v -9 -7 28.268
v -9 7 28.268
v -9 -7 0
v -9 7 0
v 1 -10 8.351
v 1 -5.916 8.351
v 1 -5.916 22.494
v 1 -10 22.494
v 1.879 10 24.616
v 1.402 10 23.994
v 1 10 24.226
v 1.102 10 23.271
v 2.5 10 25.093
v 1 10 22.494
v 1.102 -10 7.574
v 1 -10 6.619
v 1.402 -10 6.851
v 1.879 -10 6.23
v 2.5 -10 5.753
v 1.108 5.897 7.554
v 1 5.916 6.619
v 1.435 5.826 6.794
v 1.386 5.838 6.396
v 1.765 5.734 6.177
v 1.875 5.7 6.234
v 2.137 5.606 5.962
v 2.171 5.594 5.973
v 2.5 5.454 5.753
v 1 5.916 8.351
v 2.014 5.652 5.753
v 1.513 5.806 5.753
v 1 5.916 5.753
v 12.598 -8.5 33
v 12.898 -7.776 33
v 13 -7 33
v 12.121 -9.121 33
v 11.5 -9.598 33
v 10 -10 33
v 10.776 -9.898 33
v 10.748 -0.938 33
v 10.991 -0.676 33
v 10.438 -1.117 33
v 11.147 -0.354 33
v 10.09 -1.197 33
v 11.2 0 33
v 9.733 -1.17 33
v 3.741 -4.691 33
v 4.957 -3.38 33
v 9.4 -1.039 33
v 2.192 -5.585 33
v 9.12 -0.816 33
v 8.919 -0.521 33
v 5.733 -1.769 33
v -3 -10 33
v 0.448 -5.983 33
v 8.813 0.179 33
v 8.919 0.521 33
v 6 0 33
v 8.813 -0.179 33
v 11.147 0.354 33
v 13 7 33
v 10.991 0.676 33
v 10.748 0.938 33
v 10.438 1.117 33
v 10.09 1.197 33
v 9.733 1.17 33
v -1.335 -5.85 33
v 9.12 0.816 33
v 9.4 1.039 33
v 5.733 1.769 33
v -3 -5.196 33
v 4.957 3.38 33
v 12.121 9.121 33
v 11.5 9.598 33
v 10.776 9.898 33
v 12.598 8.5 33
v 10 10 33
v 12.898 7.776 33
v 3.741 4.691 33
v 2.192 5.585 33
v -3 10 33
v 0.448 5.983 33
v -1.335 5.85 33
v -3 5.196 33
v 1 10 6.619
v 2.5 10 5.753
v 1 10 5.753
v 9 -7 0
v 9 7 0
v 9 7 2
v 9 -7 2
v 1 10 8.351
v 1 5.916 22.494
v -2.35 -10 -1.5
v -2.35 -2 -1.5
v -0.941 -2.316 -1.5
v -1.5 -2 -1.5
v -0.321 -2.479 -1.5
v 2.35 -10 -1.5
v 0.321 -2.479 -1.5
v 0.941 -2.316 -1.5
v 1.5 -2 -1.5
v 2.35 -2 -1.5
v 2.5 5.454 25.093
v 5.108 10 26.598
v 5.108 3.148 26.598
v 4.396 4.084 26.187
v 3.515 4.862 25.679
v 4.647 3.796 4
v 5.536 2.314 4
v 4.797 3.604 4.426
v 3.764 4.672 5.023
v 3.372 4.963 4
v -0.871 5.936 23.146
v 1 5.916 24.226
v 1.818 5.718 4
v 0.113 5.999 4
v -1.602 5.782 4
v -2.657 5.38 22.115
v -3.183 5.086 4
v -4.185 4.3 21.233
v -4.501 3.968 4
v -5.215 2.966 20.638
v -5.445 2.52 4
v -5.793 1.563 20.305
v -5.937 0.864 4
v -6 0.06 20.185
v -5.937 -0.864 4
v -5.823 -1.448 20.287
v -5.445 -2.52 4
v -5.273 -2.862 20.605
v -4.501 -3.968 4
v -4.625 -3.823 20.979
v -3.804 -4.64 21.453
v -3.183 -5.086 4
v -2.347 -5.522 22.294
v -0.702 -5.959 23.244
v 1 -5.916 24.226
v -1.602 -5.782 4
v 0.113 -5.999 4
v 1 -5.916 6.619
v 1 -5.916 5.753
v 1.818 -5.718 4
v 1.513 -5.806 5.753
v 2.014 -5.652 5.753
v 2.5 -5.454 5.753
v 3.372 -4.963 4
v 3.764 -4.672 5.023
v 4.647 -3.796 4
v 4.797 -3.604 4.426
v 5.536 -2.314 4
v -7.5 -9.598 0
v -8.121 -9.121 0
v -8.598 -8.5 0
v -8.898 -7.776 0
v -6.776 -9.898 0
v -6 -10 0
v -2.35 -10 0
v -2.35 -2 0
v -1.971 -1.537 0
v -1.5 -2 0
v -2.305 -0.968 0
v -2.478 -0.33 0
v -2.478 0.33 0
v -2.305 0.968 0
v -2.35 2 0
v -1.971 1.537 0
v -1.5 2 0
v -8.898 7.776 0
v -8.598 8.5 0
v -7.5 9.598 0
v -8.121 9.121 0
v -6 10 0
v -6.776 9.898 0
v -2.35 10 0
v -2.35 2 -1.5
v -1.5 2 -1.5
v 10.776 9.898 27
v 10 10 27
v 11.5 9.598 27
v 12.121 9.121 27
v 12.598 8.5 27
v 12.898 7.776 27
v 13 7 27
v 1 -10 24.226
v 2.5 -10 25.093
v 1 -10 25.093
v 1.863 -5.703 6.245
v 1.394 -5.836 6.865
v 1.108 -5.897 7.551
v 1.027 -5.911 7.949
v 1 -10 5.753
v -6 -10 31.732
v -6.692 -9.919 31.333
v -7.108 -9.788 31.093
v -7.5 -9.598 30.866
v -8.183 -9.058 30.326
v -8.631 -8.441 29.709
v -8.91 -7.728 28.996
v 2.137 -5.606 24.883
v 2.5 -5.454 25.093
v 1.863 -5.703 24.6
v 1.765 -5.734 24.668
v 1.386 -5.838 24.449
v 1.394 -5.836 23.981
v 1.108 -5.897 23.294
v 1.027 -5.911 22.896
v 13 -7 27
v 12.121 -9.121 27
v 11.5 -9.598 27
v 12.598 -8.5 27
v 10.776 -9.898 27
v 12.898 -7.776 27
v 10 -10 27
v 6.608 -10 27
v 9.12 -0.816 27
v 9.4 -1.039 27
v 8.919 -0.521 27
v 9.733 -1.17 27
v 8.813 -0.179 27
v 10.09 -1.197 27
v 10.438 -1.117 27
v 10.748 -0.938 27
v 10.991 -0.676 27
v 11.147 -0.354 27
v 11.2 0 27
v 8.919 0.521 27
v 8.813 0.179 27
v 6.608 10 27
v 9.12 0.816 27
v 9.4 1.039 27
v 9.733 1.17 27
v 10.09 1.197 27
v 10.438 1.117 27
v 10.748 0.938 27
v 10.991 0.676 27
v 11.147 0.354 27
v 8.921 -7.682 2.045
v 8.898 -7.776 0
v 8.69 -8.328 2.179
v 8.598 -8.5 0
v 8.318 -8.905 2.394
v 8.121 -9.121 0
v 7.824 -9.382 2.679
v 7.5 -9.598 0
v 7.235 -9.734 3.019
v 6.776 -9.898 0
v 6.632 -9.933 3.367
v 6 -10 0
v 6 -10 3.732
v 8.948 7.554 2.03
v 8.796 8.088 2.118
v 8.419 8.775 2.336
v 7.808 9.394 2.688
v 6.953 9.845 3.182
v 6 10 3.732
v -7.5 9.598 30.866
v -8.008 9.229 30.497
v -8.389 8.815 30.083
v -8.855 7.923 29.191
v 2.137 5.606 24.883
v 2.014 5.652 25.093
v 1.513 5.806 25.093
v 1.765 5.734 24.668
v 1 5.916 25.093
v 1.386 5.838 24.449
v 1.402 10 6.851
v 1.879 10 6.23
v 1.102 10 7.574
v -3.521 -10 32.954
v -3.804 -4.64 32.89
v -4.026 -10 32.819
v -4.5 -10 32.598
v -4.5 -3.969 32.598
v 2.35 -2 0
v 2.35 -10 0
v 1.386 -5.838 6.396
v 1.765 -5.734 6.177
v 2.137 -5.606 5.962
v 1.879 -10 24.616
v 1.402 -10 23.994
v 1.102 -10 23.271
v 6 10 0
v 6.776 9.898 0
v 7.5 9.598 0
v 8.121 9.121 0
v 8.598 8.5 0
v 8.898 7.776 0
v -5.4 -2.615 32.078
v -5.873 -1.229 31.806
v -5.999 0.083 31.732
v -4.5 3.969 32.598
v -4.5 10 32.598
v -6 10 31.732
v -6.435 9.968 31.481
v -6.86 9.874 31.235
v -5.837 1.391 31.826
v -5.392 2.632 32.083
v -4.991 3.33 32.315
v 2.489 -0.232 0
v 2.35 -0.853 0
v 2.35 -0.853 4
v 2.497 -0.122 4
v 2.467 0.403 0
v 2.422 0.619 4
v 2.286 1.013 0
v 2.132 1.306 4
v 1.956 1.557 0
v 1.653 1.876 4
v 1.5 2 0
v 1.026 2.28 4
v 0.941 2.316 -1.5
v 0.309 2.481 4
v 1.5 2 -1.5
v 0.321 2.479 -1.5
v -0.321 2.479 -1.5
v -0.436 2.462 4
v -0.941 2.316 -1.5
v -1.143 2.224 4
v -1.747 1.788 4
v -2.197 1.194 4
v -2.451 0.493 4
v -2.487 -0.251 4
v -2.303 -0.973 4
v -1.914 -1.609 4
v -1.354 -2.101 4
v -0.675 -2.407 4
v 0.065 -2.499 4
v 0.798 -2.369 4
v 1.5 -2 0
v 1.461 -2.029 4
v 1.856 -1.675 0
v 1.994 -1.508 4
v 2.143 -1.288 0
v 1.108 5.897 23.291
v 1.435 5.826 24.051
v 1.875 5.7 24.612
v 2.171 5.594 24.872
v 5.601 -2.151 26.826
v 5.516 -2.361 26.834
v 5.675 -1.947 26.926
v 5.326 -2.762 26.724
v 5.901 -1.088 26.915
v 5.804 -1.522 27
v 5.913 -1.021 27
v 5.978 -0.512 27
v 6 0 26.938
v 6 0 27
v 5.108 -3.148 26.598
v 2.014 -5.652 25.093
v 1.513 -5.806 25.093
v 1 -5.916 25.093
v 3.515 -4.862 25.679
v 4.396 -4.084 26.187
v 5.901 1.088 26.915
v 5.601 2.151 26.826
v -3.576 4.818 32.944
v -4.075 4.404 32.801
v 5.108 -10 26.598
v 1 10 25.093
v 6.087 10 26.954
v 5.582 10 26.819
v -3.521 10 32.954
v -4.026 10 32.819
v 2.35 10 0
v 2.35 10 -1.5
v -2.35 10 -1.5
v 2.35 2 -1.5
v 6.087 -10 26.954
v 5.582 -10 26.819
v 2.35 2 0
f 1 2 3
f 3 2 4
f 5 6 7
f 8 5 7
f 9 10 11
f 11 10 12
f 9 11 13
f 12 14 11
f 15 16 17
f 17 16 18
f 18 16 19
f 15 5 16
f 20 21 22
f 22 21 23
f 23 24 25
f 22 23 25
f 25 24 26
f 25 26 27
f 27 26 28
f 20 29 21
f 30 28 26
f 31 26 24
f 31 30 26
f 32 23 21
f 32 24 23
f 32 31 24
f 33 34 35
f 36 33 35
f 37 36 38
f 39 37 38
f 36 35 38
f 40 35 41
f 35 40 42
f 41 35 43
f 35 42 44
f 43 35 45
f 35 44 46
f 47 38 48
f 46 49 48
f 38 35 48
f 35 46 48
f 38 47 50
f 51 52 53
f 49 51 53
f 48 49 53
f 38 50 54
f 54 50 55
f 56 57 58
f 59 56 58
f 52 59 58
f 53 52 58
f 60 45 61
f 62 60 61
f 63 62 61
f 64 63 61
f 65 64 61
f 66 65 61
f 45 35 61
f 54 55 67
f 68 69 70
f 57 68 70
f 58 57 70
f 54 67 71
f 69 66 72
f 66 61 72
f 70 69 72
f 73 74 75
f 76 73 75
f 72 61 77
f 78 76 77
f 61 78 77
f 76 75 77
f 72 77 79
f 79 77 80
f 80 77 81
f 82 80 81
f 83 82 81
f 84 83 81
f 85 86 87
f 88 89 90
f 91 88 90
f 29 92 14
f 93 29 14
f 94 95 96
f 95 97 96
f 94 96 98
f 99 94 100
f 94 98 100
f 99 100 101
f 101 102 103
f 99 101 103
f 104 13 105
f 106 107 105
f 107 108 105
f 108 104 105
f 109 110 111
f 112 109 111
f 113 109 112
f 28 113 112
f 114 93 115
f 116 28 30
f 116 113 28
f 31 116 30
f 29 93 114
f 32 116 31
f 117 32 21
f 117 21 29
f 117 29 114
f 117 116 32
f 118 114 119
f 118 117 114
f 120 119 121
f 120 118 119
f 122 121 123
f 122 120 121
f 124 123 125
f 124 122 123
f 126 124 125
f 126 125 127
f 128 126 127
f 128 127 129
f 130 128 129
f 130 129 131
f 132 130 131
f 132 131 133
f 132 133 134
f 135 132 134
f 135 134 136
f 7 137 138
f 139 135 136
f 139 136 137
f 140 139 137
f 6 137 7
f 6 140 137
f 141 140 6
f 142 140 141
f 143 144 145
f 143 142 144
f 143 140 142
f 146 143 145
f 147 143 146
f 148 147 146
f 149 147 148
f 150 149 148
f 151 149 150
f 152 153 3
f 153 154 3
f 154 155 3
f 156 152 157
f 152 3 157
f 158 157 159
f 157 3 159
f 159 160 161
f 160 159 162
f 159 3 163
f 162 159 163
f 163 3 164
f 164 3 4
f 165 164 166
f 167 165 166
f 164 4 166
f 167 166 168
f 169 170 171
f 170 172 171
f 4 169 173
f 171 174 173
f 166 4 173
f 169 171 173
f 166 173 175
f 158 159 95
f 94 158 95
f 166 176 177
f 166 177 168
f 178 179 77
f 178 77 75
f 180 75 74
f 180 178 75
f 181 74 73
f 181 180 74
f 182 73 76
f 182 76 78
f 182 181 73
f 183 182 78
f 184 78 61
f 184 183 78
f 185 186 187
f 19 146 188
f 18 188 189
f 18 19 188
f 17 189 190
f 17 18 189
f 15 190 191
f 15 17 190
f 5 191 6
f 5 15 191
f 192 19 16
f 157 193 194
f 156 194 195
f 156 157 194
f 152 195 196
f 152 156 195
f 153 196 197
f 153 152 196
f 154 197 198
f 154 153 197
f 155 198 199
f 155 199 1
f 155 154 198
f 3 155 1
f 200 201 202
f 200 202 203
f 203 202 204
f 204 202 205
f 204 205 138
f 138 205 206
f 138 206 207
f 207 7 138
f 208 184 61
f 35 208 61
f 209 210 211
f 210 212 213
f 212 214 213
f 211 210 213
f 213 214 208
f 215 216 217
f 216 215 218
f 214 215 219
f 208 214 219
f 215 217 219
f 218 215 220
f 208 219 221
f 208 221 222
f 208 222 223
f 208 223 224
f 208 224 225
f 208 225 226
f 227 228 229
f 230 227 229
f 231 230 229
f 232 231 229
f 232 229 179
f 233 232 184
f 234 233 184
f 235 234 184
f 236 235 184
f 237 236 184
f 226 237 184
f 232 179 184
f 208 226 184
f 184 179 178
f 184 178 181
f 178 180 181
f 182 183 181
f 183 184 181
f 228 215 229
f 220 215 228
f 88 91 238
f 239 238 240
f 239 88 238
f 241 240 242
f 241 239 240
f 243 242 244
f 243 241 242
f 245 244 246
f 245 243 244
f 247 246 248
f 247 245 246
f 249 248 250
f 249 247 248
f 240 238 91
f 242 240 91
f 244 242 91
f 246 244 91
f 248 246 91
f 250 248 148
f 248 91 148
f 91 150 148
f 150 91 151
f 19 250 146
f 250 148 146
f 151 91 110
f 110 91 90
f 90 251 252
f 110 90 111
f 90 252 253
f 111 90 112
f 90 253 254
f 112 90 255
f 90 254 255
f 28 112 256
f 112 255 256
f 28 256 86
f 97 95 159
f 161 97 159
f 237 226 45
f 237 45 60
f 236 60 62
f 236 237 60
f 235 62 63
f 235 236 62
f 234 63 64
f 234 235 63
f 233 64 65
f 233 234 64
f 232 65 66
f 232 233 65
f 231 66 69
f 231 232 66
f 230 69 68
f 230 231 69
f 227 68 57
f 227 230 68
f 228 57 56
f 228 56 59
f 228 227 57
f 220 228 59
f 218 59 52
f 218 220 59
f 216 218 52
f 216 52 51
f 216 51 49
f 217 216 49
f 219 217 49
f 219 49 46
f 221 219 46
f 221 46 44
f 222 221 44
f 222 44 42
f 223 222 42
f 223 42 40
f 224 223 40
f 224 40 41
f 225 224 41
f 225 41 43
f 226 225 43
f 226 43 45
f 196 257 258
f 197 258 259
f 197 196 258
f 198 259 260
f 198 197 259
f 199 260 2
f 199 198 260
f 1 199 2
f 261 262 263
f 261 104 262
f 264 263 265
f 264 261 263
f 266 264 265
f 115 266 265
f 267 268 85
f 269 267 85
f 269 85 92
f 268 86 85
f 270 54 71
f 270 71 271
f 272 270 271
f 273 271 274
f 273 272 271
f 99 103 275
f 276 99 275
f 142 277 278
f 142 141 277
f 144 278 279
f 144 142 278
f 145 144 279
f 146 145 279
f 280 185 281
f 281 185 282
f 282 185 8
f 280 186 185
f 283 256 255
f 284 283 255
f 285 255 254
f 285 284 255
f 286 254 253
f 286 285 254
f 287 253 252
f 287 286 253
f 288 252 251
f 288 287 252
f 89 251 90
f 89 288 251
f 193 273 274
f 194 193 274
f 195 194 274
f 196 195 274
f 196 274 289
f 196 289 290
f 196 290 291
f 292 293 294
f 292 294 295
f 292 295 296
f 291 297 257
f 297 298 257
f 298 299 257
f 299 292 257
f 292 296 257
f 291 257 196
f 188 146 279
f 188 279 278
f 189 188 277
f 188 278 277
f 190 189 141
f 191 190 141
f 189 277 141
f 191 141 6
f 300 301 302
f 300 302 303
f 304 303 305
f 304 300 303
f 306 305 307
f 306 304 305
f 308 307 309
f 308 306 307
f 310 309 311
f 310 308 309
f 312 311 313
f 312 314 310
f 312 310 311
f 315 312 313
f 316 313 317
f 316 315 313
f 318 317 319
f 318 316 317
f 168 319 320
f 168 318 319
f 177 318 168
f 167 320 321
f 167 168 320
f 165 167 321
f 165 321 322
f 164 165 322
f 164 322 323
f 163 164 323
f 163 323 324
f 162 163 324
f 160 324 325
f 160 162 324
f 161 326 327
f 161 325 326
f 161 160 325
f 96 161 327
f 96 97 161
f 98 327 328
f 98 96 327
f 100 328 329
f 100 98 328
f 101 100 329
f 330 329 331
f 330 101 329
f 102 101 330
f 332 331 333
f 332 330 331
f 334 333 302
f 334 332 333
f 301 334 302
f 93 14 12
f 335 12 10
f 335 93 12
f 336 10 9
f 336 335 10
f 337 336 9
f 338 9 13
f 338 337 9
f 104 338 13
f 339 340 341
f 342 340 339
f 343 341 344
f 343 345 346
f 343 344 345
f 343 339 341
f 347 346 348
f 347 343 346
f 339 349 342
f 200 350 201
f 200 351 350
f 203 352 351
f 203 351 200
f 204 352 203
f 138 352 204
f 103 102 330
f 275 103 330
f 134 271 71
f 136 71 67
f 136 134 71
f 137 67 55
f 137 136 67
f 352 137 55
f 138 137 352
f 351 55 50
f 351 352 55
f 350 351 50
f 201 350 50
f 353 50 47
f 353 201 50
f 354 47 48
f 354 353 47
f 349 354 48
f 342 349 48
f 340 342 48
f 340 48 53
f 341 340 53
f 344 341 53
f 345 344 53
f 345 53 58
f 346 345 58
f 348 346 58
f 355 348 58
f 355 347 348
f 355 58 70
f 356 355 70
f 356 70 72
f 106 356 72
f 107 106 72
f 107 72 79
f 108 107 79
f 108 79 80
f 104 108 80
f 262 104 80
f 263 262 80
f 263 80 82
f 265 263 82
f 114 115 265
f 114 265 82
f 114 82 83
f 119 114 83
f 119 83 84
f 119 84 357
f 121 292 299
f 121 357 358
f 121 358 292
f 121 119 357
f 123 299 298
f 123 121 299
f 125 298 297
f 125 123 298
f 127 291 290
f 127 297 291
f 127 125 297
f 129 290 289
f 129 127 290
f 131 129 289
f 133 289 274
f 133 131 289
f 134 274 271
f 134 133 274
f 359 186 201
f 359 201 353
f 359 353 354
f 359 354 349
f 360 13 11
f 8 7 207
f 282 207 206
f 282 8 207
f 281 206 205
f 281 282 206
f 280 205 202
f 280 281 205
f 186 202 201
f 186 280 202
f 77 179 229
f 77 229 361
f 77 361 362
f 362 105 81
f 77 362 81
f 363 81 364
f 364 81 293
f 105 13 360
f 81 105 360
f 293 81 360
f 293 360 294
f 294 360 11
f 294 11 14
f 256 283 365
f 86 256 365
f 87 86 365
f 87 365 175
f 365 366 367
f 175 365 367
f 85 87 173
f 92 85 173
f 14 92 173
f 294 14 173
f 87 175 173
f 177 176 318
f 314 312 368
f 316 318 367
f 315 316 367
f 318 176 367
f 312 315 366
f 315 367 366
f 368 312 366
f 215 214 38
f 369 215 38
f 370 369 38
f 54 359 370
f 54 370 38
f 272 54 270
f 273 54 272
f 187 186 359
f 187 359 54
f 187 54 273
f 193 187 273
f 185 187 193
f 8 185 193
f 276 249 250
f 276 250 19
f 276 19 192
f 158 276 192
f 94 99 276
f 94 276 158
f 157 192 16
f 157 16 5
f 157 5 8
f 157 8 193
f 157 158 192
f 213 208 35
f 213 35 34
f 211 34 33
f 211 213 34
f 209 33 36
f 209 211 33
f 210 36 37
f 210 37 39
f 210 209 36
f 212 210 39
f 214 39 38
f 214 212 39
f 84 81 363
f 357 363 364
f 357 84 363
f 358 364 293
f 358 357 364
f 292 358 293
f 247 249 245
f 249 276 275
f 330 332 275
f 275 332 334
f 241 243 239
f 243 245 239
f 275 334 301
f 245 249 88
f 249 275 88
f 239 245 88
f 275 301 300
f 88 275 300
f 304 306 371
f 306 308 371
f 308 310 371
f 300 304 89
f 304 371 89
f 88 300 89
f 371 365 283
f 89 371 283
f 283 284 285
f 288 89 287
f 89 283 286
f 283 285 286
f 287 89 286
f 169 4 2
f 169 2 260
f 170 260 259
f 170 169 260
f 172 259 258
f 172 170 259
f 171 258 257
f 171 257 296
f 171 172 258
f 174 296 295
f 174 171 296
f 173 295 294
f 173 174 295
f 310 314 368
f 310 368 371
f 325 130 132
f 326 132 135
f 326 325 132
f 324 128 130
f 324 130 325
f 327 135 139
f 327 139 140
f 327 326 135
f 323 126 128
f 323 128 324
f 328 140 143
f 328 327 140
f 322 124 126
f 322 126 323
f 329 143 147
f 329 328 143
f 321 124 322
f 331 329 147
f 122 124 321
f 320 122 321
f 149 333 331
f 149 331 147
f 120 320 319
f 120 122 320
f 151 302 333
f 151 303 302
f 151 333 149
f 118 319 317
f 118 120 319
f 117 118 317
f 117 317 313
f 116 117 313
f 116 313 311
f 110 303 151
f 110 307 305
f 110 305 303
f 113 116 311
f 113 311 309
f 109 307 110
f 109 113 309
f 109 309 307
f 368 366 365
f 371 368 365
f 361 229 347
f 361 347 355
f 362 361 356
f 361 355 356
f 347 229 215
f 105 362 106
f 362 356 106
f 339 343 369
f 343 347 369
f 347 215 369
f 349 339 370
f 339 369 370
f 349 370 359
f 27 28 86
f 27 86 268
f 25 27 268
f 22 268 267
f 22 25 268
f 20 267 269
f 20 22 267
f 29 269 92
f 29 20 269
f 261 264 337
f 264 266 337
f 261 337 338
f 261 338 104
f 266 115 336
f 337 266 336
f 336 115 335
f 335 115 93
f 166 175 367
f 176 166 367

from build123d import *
from build123d.topology import SkipClean

# Parameters (mm, degrees)
BOSS_EXTRU_1_DEPTH           = 10
ENL_V_MAT_EXTRU_1_DEPTH      = 29.854594898
ENL_V_MAT_EXTRU_1_DEPTH_BACK = 29.854594898
ESQUISSE2_R                  = 2.5
ENL_V_START                  = 4
ESQUISSE3_R                  = 6
ENL_V_MAT_EXTRU_2_DEPTH      = 25.390139133
ESQUISSE5_W                  = 1.5
ESQUISSE5_H                  = 4
ENL_V_MAT_EXTRU_3_DEPTH      = 30.220241272
BOSS_EXTRU_2_REACH           = 35.257
ENL_V_START_2                = -20
ESQUISSE7_R                  = 1.2
ESQUISSE7_R_2                = 6
ENL_V_MAT_EXTRU_4_DEPTH      = 20
CONG_1_START                 = -10
CONG_1_DEPTH                 = 20
CONG_1_2_DEPTH               = 20
CONG_1_START_2               = 5.75277665
CONG_1_3_OUTLINE_R           = 6
CONG_1_3_DEPTH               = 28.24722335
CONG_1_START_3               = -1.5
CONG_1_4_DEPTH               = 7.669577456
CONG_1_5_DEPTH               = 2.598076411
CONG_1_START_4               = 22.494446401
CONG_1_6_DEPTH               = 2.598076411
CONG_1_7_DEPTH               = 20


with BuildPart() as part:
    # Esquisse1 → Boss.-Extru.1 (new, symmetric)
    with BuildSketch(Plane(origin=(0, 0, 0), x_dir=(1, 0, 0), z_dir=(0, 1, 0))):
        Polygon((2.35, 0), (9, 0), (9, -2), (1, -6.618802154), (1, -25), (-9, -25), (-9, 0), (-2.35, 0), (-2.35, 1.5), (2.35, 1.5), align=None)
    extrude(amount=BOSS_EXTRU_1_DEPTH, both=True)

    # Esquisse2 → Enlèv. mat.-Extru.1 (cut, two sides: drawn at the far end of the back side and taken through both)
    with BuildSketch(Plane(origin=(-1.372446517, 0, 0), x_dir=(1, 0, 0), z_dir=(0, 0, 1)).offset(-ENL_V_MAT_EXTRU_1_DEPTH_BACK)):
        with Locations(Location((1.372446517, 0, 0), (0, 0, 340.051556411))):
            Circle(ESQUISSE2_R)
    extrude(amount=ENL_V_MAT_EXTRU_1_DEPTH + ENL_V_MAT_EXTRU_1_DEPTH_BACK, mode=Mode.SUBTRACT)

    # Esquisse3 → Enlèv. mat.-Extru.2 (cut, through all)
    with BuildSketch(Plane.XY.offset(ENL_V_START)):
        Circle(ESQUISSE3_R)
    extrude(amount=ENL_V_MAT_EXTRU_2_DEPTH, mode=Mode.SUBTRACT)

    # Esquisse5 → Enlèv. mat.-Extru.3 (cut, through all)
    with BuildSketch(Plane.ZY.offset(2.35)):
        with Locations((-0.75, 0)):
            Rectangle(ESQUISSE5_W, ESQUISSE5_H)
    extrude(amount=-ENL_V_MAT_EXTRU_3_DEPTH, mode=Mode.SUBTRACT)

    # Boss.-Extru.2: up to this face of the body (flat: up to its plane)
    boss_extru_2_end = Plane(part.part.faces().sort_by_distance((-2.923443816, -10, 10.980550797))[0])
    # Esquisse6 → Boss.-Extru.2 (add, up to the picked face)
    with BuildSketch(Plane(origin=(0, 10, 0), x_dir=(1, 0, 0), z_dir=(0, 1, 0)), mode=Mode.PRIVATE) as boss_extru_2_sk1:
        Polygon((-9, -18.452994616), (5.803847577, -27), (13, -27), (13, -33), (-3.803847577, -33), (-9, -30), align=None)
    boss_extru_2_tool1 = split(extrude(boss_extru_2_sk1.sketch, amount=-BOSS_EXTRU_2_REACH, mode=Mode.PRIVATE), bisect_by=boss_extru_2_end, keep=Keep.BOTH, mode=Mode.PRIVATE)
    add(boss_extru_2_tool1.solids().sort_by(Axis((0.338478, 10, 27.943024), (0, -1, 0)))[0])

    # Esquisse7 → Enlèv. mat.-Extru.4 (cut)
    with BuildSketch(Plane.XY.offset(33).offset(ENL_V_START_2)):
        with Locations((10, 0)):
            Circle(ESQUISSE7_R)
        with Locations(Location((0, 0, 0), (0, 0, 230.656026391))):
            Circle(ESQUISSE7_R_2)
    extrude(amount=ENL_V_MAT_EXTRU_4_DEPTH, mode=Mode.SUBTRACT)

    # Congé1: read off the stored shape, not the designer's step
    # Congé1 outline → Congé1 (cut)
    with BuildSketch(Plane(origin=(0, 0, 0), x_dir=(1, 0, 0), z_dir=(0, 1, 0)).offset(CONG_1_START)):
        with BuildLine():
            Line((-9, -30), (-7.5, -30.866025404))
            ThreePointArc((-7.5, -30.866025404), (-8.598076211, -29.767949192), (-9, -28.267949192))
            Line((-9, -28.267949192), (-9, -30))
        make_face()
    extrude(amount=CONG_1_DEPTH, mode=Mode.SUBTRACT)

    # Cong_1 2 outline → Cong_1 2 (add)
    with BuildSketch(Plane(origin=(0, 0, 0), x_dir=(1, 0, 0), z_dir=(0, 1, 0)).offset(CONG_1_START)):
        with BuildLine():
            Line((5.803847577, -27), (6.607695155, -27))
            ThreePointArc((6.607695155, -27), (5.83123802, -26.897777479), (5.107695155, -26.598076211))
            Line((5.107695155, -26.598076211), (5.803847577, -27))
        make_face()
    extrude(amount=CONG_1_2_DEPTH)

    # Cong_1 3 outline → Cong_1 3 (cut)
    with BuildSketch(Plane.XY.offset(CONG_1_START_2)):
        with BuildLine():
            Line((-9, 10), (-9, 7))
            ThreePointArc((-9, 7), (-8.121320344, 9.121320344), (-6, 10))
            Line((-6, 10), (-9, 10))
        make_face()
        with BuildLine():
            ThreePointArc((-6, -10), (-8.121320344, -9.121320344), (-9, -7))
            Line((-9, -7), (-9, -10))
            Line((-9, -10), (-6, -10))
        make_face()
        Circle(CONG_1_3_OUTLINE_R)
        with BuildLine():
            Line((13, 10), (10, 10))
            ThreePointArc((10, 10), (12.121320344, 9.121320344), (13, 7))
            Line((13, 7), (13, 10))
        make_face()
        with BuildLine():
            ThreePointArc((13, -7), (12.121320344, -9.121320344), (10, -10))
            Line((10, -10), (13, -10))
            Line((13, -10), (13, -7))
        make_face()
    extrude(amount=CONG_1_3_DEPTH, mode=Mode.SUBTRACT)

    # Cong_1 4 outline → Cong_1 4 (cut)
    with BuildSketch(Plane.XY.offset(CONG_1_START_3)):
        with BuildLine():
            Line((-9, 10), (-9, 7))
            ThreePointArc((-9, 7), (-8.121320344, 9.121320344), (-6, 10))
            Line((-6, 10), (-9, 10))
        make_face()
        with BuildLine():
            ThreePointArc((-6, -10), (-8.121320344, -9.121320344), (-9, -7))
            Line((-9, -7), (-9, -10))
            Line((-9, -10), (-6, -10))
        make_face()
        with BuildLine():
            Line((9, 10), (6, 10))
            ThreePointArc((6, 10), (8.121320344, 9.121320344), (9, 7))
            Line((9, 7), (9, 10))
        make_face()
        with BuildLine():
            ThreePointArc((9, -7), (8.121320344, -9.121320344), (6, -10))
            Line((6, -10), (9, -10))
            Line((9, -10), (9, -7))
        make_face()
    extrude(amount=CONG_1_4_DEPTH, mode=Mode.SUBTRACT)

    # Cong_1 5 outline → Cong_1 5 (add)
    with SkipClean():  # the faces are left unmerged after this step: merging them gives an invalid solid
        with BuildSketch(Plane.XY.offset(CONG_1_START_2)):
            with BuildLine():
                Line((6, 10), (1, 10))
                Line((1, 10), (1, 5.916079783))
                ThreePointArc((1, 5.916079783), (6, 0), (1, -5.916079783))
                Line((1, -5.916079783), (1, -10))
                Line((1, -10), (6, -10))
                ThreePointArc((6, -10), (8.121320344, -9.121320344), (9, -7))
                Line((9, -7), (9, 7))
                ThreePointArc((9, 7), (8.121320344, 9.121320344), (6, 10))
            make_face()
        extrude(amount=CONG_1_5_DEPTH)

    # Cong_1 6 outline → Cong_1 6 (add)
    with SkipClean():  # the faces are left unmerged after this step: merging them gives an invalid solid
        with BuildSketch(Plane.XY.offset(CONG_1_START_4)):
            with BuildLine():
                Line((6, 10), (1, 10))
                Line((1, 10), (1, 5.916079783))
                ThreePointArc((1, 5.916079783), (6, 0), (1, -5.916079783))
                Line((1, -5.916079783), (1, -10))
                Line((1, -10), (6, -10))
                ThreePointArc((6, -10), (8.121320344, -9.121320344), (9, -7))
                Line((9, -7), (9, 7))
                ThreePointArc((9, 7), (8.121320344, 9.121320344), (6, 10))
            make_face()
        extrude(amount=CONG_1_6_DEPTH)

    # Cong_1 7 outline → Cong_1 7 (cut)
    with SkipClean():  # the faces are left unmerged after this step: merging them gives an invalid solid
        with BuildSketch(Plane(origin=(0, 0, 0), x_dir=(1, 0, 0), z_dir=(0, 1, 0)).offset(CONG_1_START)):
            with BuildLine():
                ThreePointArc((-3, -33), (-3.776457135, -32.897777479), (-4.5, -32.598076211))
                Line((-4.5, -32.598076211), (-3.803847577, -33))
                Line((-3.803847577, -33), (-3, -33))
            make_face()
            with BuildLine():
                ThreePointArc((1, -22.494446501), (1.401923789, -23.994446501), (2.5, -25.092522712))
                Line((2.5, -25.092522712), (9, -25.092522812))
                Line((9, -25.092522812), (9, -22.494446401))
                Line((9, -22.494446401), (1, -22.494446501))
            make_face()
            with BuildLine():
                Line((9, -5.75277665), (2.5, -5.75277675))
                ThreePointArc((2.5, -5.75277675), (1.401923789, -6.850852961), (1, -8.350852961))
                Line((1, -8.350852961), (9, -8.350853061))
                Line((9, -8.350853061), (9, -5.75277665))
            make_face()
        extrude(amount=CONG_1_7_DEPTH, mode=Mode.SUBTRACT)


solid = part.part
